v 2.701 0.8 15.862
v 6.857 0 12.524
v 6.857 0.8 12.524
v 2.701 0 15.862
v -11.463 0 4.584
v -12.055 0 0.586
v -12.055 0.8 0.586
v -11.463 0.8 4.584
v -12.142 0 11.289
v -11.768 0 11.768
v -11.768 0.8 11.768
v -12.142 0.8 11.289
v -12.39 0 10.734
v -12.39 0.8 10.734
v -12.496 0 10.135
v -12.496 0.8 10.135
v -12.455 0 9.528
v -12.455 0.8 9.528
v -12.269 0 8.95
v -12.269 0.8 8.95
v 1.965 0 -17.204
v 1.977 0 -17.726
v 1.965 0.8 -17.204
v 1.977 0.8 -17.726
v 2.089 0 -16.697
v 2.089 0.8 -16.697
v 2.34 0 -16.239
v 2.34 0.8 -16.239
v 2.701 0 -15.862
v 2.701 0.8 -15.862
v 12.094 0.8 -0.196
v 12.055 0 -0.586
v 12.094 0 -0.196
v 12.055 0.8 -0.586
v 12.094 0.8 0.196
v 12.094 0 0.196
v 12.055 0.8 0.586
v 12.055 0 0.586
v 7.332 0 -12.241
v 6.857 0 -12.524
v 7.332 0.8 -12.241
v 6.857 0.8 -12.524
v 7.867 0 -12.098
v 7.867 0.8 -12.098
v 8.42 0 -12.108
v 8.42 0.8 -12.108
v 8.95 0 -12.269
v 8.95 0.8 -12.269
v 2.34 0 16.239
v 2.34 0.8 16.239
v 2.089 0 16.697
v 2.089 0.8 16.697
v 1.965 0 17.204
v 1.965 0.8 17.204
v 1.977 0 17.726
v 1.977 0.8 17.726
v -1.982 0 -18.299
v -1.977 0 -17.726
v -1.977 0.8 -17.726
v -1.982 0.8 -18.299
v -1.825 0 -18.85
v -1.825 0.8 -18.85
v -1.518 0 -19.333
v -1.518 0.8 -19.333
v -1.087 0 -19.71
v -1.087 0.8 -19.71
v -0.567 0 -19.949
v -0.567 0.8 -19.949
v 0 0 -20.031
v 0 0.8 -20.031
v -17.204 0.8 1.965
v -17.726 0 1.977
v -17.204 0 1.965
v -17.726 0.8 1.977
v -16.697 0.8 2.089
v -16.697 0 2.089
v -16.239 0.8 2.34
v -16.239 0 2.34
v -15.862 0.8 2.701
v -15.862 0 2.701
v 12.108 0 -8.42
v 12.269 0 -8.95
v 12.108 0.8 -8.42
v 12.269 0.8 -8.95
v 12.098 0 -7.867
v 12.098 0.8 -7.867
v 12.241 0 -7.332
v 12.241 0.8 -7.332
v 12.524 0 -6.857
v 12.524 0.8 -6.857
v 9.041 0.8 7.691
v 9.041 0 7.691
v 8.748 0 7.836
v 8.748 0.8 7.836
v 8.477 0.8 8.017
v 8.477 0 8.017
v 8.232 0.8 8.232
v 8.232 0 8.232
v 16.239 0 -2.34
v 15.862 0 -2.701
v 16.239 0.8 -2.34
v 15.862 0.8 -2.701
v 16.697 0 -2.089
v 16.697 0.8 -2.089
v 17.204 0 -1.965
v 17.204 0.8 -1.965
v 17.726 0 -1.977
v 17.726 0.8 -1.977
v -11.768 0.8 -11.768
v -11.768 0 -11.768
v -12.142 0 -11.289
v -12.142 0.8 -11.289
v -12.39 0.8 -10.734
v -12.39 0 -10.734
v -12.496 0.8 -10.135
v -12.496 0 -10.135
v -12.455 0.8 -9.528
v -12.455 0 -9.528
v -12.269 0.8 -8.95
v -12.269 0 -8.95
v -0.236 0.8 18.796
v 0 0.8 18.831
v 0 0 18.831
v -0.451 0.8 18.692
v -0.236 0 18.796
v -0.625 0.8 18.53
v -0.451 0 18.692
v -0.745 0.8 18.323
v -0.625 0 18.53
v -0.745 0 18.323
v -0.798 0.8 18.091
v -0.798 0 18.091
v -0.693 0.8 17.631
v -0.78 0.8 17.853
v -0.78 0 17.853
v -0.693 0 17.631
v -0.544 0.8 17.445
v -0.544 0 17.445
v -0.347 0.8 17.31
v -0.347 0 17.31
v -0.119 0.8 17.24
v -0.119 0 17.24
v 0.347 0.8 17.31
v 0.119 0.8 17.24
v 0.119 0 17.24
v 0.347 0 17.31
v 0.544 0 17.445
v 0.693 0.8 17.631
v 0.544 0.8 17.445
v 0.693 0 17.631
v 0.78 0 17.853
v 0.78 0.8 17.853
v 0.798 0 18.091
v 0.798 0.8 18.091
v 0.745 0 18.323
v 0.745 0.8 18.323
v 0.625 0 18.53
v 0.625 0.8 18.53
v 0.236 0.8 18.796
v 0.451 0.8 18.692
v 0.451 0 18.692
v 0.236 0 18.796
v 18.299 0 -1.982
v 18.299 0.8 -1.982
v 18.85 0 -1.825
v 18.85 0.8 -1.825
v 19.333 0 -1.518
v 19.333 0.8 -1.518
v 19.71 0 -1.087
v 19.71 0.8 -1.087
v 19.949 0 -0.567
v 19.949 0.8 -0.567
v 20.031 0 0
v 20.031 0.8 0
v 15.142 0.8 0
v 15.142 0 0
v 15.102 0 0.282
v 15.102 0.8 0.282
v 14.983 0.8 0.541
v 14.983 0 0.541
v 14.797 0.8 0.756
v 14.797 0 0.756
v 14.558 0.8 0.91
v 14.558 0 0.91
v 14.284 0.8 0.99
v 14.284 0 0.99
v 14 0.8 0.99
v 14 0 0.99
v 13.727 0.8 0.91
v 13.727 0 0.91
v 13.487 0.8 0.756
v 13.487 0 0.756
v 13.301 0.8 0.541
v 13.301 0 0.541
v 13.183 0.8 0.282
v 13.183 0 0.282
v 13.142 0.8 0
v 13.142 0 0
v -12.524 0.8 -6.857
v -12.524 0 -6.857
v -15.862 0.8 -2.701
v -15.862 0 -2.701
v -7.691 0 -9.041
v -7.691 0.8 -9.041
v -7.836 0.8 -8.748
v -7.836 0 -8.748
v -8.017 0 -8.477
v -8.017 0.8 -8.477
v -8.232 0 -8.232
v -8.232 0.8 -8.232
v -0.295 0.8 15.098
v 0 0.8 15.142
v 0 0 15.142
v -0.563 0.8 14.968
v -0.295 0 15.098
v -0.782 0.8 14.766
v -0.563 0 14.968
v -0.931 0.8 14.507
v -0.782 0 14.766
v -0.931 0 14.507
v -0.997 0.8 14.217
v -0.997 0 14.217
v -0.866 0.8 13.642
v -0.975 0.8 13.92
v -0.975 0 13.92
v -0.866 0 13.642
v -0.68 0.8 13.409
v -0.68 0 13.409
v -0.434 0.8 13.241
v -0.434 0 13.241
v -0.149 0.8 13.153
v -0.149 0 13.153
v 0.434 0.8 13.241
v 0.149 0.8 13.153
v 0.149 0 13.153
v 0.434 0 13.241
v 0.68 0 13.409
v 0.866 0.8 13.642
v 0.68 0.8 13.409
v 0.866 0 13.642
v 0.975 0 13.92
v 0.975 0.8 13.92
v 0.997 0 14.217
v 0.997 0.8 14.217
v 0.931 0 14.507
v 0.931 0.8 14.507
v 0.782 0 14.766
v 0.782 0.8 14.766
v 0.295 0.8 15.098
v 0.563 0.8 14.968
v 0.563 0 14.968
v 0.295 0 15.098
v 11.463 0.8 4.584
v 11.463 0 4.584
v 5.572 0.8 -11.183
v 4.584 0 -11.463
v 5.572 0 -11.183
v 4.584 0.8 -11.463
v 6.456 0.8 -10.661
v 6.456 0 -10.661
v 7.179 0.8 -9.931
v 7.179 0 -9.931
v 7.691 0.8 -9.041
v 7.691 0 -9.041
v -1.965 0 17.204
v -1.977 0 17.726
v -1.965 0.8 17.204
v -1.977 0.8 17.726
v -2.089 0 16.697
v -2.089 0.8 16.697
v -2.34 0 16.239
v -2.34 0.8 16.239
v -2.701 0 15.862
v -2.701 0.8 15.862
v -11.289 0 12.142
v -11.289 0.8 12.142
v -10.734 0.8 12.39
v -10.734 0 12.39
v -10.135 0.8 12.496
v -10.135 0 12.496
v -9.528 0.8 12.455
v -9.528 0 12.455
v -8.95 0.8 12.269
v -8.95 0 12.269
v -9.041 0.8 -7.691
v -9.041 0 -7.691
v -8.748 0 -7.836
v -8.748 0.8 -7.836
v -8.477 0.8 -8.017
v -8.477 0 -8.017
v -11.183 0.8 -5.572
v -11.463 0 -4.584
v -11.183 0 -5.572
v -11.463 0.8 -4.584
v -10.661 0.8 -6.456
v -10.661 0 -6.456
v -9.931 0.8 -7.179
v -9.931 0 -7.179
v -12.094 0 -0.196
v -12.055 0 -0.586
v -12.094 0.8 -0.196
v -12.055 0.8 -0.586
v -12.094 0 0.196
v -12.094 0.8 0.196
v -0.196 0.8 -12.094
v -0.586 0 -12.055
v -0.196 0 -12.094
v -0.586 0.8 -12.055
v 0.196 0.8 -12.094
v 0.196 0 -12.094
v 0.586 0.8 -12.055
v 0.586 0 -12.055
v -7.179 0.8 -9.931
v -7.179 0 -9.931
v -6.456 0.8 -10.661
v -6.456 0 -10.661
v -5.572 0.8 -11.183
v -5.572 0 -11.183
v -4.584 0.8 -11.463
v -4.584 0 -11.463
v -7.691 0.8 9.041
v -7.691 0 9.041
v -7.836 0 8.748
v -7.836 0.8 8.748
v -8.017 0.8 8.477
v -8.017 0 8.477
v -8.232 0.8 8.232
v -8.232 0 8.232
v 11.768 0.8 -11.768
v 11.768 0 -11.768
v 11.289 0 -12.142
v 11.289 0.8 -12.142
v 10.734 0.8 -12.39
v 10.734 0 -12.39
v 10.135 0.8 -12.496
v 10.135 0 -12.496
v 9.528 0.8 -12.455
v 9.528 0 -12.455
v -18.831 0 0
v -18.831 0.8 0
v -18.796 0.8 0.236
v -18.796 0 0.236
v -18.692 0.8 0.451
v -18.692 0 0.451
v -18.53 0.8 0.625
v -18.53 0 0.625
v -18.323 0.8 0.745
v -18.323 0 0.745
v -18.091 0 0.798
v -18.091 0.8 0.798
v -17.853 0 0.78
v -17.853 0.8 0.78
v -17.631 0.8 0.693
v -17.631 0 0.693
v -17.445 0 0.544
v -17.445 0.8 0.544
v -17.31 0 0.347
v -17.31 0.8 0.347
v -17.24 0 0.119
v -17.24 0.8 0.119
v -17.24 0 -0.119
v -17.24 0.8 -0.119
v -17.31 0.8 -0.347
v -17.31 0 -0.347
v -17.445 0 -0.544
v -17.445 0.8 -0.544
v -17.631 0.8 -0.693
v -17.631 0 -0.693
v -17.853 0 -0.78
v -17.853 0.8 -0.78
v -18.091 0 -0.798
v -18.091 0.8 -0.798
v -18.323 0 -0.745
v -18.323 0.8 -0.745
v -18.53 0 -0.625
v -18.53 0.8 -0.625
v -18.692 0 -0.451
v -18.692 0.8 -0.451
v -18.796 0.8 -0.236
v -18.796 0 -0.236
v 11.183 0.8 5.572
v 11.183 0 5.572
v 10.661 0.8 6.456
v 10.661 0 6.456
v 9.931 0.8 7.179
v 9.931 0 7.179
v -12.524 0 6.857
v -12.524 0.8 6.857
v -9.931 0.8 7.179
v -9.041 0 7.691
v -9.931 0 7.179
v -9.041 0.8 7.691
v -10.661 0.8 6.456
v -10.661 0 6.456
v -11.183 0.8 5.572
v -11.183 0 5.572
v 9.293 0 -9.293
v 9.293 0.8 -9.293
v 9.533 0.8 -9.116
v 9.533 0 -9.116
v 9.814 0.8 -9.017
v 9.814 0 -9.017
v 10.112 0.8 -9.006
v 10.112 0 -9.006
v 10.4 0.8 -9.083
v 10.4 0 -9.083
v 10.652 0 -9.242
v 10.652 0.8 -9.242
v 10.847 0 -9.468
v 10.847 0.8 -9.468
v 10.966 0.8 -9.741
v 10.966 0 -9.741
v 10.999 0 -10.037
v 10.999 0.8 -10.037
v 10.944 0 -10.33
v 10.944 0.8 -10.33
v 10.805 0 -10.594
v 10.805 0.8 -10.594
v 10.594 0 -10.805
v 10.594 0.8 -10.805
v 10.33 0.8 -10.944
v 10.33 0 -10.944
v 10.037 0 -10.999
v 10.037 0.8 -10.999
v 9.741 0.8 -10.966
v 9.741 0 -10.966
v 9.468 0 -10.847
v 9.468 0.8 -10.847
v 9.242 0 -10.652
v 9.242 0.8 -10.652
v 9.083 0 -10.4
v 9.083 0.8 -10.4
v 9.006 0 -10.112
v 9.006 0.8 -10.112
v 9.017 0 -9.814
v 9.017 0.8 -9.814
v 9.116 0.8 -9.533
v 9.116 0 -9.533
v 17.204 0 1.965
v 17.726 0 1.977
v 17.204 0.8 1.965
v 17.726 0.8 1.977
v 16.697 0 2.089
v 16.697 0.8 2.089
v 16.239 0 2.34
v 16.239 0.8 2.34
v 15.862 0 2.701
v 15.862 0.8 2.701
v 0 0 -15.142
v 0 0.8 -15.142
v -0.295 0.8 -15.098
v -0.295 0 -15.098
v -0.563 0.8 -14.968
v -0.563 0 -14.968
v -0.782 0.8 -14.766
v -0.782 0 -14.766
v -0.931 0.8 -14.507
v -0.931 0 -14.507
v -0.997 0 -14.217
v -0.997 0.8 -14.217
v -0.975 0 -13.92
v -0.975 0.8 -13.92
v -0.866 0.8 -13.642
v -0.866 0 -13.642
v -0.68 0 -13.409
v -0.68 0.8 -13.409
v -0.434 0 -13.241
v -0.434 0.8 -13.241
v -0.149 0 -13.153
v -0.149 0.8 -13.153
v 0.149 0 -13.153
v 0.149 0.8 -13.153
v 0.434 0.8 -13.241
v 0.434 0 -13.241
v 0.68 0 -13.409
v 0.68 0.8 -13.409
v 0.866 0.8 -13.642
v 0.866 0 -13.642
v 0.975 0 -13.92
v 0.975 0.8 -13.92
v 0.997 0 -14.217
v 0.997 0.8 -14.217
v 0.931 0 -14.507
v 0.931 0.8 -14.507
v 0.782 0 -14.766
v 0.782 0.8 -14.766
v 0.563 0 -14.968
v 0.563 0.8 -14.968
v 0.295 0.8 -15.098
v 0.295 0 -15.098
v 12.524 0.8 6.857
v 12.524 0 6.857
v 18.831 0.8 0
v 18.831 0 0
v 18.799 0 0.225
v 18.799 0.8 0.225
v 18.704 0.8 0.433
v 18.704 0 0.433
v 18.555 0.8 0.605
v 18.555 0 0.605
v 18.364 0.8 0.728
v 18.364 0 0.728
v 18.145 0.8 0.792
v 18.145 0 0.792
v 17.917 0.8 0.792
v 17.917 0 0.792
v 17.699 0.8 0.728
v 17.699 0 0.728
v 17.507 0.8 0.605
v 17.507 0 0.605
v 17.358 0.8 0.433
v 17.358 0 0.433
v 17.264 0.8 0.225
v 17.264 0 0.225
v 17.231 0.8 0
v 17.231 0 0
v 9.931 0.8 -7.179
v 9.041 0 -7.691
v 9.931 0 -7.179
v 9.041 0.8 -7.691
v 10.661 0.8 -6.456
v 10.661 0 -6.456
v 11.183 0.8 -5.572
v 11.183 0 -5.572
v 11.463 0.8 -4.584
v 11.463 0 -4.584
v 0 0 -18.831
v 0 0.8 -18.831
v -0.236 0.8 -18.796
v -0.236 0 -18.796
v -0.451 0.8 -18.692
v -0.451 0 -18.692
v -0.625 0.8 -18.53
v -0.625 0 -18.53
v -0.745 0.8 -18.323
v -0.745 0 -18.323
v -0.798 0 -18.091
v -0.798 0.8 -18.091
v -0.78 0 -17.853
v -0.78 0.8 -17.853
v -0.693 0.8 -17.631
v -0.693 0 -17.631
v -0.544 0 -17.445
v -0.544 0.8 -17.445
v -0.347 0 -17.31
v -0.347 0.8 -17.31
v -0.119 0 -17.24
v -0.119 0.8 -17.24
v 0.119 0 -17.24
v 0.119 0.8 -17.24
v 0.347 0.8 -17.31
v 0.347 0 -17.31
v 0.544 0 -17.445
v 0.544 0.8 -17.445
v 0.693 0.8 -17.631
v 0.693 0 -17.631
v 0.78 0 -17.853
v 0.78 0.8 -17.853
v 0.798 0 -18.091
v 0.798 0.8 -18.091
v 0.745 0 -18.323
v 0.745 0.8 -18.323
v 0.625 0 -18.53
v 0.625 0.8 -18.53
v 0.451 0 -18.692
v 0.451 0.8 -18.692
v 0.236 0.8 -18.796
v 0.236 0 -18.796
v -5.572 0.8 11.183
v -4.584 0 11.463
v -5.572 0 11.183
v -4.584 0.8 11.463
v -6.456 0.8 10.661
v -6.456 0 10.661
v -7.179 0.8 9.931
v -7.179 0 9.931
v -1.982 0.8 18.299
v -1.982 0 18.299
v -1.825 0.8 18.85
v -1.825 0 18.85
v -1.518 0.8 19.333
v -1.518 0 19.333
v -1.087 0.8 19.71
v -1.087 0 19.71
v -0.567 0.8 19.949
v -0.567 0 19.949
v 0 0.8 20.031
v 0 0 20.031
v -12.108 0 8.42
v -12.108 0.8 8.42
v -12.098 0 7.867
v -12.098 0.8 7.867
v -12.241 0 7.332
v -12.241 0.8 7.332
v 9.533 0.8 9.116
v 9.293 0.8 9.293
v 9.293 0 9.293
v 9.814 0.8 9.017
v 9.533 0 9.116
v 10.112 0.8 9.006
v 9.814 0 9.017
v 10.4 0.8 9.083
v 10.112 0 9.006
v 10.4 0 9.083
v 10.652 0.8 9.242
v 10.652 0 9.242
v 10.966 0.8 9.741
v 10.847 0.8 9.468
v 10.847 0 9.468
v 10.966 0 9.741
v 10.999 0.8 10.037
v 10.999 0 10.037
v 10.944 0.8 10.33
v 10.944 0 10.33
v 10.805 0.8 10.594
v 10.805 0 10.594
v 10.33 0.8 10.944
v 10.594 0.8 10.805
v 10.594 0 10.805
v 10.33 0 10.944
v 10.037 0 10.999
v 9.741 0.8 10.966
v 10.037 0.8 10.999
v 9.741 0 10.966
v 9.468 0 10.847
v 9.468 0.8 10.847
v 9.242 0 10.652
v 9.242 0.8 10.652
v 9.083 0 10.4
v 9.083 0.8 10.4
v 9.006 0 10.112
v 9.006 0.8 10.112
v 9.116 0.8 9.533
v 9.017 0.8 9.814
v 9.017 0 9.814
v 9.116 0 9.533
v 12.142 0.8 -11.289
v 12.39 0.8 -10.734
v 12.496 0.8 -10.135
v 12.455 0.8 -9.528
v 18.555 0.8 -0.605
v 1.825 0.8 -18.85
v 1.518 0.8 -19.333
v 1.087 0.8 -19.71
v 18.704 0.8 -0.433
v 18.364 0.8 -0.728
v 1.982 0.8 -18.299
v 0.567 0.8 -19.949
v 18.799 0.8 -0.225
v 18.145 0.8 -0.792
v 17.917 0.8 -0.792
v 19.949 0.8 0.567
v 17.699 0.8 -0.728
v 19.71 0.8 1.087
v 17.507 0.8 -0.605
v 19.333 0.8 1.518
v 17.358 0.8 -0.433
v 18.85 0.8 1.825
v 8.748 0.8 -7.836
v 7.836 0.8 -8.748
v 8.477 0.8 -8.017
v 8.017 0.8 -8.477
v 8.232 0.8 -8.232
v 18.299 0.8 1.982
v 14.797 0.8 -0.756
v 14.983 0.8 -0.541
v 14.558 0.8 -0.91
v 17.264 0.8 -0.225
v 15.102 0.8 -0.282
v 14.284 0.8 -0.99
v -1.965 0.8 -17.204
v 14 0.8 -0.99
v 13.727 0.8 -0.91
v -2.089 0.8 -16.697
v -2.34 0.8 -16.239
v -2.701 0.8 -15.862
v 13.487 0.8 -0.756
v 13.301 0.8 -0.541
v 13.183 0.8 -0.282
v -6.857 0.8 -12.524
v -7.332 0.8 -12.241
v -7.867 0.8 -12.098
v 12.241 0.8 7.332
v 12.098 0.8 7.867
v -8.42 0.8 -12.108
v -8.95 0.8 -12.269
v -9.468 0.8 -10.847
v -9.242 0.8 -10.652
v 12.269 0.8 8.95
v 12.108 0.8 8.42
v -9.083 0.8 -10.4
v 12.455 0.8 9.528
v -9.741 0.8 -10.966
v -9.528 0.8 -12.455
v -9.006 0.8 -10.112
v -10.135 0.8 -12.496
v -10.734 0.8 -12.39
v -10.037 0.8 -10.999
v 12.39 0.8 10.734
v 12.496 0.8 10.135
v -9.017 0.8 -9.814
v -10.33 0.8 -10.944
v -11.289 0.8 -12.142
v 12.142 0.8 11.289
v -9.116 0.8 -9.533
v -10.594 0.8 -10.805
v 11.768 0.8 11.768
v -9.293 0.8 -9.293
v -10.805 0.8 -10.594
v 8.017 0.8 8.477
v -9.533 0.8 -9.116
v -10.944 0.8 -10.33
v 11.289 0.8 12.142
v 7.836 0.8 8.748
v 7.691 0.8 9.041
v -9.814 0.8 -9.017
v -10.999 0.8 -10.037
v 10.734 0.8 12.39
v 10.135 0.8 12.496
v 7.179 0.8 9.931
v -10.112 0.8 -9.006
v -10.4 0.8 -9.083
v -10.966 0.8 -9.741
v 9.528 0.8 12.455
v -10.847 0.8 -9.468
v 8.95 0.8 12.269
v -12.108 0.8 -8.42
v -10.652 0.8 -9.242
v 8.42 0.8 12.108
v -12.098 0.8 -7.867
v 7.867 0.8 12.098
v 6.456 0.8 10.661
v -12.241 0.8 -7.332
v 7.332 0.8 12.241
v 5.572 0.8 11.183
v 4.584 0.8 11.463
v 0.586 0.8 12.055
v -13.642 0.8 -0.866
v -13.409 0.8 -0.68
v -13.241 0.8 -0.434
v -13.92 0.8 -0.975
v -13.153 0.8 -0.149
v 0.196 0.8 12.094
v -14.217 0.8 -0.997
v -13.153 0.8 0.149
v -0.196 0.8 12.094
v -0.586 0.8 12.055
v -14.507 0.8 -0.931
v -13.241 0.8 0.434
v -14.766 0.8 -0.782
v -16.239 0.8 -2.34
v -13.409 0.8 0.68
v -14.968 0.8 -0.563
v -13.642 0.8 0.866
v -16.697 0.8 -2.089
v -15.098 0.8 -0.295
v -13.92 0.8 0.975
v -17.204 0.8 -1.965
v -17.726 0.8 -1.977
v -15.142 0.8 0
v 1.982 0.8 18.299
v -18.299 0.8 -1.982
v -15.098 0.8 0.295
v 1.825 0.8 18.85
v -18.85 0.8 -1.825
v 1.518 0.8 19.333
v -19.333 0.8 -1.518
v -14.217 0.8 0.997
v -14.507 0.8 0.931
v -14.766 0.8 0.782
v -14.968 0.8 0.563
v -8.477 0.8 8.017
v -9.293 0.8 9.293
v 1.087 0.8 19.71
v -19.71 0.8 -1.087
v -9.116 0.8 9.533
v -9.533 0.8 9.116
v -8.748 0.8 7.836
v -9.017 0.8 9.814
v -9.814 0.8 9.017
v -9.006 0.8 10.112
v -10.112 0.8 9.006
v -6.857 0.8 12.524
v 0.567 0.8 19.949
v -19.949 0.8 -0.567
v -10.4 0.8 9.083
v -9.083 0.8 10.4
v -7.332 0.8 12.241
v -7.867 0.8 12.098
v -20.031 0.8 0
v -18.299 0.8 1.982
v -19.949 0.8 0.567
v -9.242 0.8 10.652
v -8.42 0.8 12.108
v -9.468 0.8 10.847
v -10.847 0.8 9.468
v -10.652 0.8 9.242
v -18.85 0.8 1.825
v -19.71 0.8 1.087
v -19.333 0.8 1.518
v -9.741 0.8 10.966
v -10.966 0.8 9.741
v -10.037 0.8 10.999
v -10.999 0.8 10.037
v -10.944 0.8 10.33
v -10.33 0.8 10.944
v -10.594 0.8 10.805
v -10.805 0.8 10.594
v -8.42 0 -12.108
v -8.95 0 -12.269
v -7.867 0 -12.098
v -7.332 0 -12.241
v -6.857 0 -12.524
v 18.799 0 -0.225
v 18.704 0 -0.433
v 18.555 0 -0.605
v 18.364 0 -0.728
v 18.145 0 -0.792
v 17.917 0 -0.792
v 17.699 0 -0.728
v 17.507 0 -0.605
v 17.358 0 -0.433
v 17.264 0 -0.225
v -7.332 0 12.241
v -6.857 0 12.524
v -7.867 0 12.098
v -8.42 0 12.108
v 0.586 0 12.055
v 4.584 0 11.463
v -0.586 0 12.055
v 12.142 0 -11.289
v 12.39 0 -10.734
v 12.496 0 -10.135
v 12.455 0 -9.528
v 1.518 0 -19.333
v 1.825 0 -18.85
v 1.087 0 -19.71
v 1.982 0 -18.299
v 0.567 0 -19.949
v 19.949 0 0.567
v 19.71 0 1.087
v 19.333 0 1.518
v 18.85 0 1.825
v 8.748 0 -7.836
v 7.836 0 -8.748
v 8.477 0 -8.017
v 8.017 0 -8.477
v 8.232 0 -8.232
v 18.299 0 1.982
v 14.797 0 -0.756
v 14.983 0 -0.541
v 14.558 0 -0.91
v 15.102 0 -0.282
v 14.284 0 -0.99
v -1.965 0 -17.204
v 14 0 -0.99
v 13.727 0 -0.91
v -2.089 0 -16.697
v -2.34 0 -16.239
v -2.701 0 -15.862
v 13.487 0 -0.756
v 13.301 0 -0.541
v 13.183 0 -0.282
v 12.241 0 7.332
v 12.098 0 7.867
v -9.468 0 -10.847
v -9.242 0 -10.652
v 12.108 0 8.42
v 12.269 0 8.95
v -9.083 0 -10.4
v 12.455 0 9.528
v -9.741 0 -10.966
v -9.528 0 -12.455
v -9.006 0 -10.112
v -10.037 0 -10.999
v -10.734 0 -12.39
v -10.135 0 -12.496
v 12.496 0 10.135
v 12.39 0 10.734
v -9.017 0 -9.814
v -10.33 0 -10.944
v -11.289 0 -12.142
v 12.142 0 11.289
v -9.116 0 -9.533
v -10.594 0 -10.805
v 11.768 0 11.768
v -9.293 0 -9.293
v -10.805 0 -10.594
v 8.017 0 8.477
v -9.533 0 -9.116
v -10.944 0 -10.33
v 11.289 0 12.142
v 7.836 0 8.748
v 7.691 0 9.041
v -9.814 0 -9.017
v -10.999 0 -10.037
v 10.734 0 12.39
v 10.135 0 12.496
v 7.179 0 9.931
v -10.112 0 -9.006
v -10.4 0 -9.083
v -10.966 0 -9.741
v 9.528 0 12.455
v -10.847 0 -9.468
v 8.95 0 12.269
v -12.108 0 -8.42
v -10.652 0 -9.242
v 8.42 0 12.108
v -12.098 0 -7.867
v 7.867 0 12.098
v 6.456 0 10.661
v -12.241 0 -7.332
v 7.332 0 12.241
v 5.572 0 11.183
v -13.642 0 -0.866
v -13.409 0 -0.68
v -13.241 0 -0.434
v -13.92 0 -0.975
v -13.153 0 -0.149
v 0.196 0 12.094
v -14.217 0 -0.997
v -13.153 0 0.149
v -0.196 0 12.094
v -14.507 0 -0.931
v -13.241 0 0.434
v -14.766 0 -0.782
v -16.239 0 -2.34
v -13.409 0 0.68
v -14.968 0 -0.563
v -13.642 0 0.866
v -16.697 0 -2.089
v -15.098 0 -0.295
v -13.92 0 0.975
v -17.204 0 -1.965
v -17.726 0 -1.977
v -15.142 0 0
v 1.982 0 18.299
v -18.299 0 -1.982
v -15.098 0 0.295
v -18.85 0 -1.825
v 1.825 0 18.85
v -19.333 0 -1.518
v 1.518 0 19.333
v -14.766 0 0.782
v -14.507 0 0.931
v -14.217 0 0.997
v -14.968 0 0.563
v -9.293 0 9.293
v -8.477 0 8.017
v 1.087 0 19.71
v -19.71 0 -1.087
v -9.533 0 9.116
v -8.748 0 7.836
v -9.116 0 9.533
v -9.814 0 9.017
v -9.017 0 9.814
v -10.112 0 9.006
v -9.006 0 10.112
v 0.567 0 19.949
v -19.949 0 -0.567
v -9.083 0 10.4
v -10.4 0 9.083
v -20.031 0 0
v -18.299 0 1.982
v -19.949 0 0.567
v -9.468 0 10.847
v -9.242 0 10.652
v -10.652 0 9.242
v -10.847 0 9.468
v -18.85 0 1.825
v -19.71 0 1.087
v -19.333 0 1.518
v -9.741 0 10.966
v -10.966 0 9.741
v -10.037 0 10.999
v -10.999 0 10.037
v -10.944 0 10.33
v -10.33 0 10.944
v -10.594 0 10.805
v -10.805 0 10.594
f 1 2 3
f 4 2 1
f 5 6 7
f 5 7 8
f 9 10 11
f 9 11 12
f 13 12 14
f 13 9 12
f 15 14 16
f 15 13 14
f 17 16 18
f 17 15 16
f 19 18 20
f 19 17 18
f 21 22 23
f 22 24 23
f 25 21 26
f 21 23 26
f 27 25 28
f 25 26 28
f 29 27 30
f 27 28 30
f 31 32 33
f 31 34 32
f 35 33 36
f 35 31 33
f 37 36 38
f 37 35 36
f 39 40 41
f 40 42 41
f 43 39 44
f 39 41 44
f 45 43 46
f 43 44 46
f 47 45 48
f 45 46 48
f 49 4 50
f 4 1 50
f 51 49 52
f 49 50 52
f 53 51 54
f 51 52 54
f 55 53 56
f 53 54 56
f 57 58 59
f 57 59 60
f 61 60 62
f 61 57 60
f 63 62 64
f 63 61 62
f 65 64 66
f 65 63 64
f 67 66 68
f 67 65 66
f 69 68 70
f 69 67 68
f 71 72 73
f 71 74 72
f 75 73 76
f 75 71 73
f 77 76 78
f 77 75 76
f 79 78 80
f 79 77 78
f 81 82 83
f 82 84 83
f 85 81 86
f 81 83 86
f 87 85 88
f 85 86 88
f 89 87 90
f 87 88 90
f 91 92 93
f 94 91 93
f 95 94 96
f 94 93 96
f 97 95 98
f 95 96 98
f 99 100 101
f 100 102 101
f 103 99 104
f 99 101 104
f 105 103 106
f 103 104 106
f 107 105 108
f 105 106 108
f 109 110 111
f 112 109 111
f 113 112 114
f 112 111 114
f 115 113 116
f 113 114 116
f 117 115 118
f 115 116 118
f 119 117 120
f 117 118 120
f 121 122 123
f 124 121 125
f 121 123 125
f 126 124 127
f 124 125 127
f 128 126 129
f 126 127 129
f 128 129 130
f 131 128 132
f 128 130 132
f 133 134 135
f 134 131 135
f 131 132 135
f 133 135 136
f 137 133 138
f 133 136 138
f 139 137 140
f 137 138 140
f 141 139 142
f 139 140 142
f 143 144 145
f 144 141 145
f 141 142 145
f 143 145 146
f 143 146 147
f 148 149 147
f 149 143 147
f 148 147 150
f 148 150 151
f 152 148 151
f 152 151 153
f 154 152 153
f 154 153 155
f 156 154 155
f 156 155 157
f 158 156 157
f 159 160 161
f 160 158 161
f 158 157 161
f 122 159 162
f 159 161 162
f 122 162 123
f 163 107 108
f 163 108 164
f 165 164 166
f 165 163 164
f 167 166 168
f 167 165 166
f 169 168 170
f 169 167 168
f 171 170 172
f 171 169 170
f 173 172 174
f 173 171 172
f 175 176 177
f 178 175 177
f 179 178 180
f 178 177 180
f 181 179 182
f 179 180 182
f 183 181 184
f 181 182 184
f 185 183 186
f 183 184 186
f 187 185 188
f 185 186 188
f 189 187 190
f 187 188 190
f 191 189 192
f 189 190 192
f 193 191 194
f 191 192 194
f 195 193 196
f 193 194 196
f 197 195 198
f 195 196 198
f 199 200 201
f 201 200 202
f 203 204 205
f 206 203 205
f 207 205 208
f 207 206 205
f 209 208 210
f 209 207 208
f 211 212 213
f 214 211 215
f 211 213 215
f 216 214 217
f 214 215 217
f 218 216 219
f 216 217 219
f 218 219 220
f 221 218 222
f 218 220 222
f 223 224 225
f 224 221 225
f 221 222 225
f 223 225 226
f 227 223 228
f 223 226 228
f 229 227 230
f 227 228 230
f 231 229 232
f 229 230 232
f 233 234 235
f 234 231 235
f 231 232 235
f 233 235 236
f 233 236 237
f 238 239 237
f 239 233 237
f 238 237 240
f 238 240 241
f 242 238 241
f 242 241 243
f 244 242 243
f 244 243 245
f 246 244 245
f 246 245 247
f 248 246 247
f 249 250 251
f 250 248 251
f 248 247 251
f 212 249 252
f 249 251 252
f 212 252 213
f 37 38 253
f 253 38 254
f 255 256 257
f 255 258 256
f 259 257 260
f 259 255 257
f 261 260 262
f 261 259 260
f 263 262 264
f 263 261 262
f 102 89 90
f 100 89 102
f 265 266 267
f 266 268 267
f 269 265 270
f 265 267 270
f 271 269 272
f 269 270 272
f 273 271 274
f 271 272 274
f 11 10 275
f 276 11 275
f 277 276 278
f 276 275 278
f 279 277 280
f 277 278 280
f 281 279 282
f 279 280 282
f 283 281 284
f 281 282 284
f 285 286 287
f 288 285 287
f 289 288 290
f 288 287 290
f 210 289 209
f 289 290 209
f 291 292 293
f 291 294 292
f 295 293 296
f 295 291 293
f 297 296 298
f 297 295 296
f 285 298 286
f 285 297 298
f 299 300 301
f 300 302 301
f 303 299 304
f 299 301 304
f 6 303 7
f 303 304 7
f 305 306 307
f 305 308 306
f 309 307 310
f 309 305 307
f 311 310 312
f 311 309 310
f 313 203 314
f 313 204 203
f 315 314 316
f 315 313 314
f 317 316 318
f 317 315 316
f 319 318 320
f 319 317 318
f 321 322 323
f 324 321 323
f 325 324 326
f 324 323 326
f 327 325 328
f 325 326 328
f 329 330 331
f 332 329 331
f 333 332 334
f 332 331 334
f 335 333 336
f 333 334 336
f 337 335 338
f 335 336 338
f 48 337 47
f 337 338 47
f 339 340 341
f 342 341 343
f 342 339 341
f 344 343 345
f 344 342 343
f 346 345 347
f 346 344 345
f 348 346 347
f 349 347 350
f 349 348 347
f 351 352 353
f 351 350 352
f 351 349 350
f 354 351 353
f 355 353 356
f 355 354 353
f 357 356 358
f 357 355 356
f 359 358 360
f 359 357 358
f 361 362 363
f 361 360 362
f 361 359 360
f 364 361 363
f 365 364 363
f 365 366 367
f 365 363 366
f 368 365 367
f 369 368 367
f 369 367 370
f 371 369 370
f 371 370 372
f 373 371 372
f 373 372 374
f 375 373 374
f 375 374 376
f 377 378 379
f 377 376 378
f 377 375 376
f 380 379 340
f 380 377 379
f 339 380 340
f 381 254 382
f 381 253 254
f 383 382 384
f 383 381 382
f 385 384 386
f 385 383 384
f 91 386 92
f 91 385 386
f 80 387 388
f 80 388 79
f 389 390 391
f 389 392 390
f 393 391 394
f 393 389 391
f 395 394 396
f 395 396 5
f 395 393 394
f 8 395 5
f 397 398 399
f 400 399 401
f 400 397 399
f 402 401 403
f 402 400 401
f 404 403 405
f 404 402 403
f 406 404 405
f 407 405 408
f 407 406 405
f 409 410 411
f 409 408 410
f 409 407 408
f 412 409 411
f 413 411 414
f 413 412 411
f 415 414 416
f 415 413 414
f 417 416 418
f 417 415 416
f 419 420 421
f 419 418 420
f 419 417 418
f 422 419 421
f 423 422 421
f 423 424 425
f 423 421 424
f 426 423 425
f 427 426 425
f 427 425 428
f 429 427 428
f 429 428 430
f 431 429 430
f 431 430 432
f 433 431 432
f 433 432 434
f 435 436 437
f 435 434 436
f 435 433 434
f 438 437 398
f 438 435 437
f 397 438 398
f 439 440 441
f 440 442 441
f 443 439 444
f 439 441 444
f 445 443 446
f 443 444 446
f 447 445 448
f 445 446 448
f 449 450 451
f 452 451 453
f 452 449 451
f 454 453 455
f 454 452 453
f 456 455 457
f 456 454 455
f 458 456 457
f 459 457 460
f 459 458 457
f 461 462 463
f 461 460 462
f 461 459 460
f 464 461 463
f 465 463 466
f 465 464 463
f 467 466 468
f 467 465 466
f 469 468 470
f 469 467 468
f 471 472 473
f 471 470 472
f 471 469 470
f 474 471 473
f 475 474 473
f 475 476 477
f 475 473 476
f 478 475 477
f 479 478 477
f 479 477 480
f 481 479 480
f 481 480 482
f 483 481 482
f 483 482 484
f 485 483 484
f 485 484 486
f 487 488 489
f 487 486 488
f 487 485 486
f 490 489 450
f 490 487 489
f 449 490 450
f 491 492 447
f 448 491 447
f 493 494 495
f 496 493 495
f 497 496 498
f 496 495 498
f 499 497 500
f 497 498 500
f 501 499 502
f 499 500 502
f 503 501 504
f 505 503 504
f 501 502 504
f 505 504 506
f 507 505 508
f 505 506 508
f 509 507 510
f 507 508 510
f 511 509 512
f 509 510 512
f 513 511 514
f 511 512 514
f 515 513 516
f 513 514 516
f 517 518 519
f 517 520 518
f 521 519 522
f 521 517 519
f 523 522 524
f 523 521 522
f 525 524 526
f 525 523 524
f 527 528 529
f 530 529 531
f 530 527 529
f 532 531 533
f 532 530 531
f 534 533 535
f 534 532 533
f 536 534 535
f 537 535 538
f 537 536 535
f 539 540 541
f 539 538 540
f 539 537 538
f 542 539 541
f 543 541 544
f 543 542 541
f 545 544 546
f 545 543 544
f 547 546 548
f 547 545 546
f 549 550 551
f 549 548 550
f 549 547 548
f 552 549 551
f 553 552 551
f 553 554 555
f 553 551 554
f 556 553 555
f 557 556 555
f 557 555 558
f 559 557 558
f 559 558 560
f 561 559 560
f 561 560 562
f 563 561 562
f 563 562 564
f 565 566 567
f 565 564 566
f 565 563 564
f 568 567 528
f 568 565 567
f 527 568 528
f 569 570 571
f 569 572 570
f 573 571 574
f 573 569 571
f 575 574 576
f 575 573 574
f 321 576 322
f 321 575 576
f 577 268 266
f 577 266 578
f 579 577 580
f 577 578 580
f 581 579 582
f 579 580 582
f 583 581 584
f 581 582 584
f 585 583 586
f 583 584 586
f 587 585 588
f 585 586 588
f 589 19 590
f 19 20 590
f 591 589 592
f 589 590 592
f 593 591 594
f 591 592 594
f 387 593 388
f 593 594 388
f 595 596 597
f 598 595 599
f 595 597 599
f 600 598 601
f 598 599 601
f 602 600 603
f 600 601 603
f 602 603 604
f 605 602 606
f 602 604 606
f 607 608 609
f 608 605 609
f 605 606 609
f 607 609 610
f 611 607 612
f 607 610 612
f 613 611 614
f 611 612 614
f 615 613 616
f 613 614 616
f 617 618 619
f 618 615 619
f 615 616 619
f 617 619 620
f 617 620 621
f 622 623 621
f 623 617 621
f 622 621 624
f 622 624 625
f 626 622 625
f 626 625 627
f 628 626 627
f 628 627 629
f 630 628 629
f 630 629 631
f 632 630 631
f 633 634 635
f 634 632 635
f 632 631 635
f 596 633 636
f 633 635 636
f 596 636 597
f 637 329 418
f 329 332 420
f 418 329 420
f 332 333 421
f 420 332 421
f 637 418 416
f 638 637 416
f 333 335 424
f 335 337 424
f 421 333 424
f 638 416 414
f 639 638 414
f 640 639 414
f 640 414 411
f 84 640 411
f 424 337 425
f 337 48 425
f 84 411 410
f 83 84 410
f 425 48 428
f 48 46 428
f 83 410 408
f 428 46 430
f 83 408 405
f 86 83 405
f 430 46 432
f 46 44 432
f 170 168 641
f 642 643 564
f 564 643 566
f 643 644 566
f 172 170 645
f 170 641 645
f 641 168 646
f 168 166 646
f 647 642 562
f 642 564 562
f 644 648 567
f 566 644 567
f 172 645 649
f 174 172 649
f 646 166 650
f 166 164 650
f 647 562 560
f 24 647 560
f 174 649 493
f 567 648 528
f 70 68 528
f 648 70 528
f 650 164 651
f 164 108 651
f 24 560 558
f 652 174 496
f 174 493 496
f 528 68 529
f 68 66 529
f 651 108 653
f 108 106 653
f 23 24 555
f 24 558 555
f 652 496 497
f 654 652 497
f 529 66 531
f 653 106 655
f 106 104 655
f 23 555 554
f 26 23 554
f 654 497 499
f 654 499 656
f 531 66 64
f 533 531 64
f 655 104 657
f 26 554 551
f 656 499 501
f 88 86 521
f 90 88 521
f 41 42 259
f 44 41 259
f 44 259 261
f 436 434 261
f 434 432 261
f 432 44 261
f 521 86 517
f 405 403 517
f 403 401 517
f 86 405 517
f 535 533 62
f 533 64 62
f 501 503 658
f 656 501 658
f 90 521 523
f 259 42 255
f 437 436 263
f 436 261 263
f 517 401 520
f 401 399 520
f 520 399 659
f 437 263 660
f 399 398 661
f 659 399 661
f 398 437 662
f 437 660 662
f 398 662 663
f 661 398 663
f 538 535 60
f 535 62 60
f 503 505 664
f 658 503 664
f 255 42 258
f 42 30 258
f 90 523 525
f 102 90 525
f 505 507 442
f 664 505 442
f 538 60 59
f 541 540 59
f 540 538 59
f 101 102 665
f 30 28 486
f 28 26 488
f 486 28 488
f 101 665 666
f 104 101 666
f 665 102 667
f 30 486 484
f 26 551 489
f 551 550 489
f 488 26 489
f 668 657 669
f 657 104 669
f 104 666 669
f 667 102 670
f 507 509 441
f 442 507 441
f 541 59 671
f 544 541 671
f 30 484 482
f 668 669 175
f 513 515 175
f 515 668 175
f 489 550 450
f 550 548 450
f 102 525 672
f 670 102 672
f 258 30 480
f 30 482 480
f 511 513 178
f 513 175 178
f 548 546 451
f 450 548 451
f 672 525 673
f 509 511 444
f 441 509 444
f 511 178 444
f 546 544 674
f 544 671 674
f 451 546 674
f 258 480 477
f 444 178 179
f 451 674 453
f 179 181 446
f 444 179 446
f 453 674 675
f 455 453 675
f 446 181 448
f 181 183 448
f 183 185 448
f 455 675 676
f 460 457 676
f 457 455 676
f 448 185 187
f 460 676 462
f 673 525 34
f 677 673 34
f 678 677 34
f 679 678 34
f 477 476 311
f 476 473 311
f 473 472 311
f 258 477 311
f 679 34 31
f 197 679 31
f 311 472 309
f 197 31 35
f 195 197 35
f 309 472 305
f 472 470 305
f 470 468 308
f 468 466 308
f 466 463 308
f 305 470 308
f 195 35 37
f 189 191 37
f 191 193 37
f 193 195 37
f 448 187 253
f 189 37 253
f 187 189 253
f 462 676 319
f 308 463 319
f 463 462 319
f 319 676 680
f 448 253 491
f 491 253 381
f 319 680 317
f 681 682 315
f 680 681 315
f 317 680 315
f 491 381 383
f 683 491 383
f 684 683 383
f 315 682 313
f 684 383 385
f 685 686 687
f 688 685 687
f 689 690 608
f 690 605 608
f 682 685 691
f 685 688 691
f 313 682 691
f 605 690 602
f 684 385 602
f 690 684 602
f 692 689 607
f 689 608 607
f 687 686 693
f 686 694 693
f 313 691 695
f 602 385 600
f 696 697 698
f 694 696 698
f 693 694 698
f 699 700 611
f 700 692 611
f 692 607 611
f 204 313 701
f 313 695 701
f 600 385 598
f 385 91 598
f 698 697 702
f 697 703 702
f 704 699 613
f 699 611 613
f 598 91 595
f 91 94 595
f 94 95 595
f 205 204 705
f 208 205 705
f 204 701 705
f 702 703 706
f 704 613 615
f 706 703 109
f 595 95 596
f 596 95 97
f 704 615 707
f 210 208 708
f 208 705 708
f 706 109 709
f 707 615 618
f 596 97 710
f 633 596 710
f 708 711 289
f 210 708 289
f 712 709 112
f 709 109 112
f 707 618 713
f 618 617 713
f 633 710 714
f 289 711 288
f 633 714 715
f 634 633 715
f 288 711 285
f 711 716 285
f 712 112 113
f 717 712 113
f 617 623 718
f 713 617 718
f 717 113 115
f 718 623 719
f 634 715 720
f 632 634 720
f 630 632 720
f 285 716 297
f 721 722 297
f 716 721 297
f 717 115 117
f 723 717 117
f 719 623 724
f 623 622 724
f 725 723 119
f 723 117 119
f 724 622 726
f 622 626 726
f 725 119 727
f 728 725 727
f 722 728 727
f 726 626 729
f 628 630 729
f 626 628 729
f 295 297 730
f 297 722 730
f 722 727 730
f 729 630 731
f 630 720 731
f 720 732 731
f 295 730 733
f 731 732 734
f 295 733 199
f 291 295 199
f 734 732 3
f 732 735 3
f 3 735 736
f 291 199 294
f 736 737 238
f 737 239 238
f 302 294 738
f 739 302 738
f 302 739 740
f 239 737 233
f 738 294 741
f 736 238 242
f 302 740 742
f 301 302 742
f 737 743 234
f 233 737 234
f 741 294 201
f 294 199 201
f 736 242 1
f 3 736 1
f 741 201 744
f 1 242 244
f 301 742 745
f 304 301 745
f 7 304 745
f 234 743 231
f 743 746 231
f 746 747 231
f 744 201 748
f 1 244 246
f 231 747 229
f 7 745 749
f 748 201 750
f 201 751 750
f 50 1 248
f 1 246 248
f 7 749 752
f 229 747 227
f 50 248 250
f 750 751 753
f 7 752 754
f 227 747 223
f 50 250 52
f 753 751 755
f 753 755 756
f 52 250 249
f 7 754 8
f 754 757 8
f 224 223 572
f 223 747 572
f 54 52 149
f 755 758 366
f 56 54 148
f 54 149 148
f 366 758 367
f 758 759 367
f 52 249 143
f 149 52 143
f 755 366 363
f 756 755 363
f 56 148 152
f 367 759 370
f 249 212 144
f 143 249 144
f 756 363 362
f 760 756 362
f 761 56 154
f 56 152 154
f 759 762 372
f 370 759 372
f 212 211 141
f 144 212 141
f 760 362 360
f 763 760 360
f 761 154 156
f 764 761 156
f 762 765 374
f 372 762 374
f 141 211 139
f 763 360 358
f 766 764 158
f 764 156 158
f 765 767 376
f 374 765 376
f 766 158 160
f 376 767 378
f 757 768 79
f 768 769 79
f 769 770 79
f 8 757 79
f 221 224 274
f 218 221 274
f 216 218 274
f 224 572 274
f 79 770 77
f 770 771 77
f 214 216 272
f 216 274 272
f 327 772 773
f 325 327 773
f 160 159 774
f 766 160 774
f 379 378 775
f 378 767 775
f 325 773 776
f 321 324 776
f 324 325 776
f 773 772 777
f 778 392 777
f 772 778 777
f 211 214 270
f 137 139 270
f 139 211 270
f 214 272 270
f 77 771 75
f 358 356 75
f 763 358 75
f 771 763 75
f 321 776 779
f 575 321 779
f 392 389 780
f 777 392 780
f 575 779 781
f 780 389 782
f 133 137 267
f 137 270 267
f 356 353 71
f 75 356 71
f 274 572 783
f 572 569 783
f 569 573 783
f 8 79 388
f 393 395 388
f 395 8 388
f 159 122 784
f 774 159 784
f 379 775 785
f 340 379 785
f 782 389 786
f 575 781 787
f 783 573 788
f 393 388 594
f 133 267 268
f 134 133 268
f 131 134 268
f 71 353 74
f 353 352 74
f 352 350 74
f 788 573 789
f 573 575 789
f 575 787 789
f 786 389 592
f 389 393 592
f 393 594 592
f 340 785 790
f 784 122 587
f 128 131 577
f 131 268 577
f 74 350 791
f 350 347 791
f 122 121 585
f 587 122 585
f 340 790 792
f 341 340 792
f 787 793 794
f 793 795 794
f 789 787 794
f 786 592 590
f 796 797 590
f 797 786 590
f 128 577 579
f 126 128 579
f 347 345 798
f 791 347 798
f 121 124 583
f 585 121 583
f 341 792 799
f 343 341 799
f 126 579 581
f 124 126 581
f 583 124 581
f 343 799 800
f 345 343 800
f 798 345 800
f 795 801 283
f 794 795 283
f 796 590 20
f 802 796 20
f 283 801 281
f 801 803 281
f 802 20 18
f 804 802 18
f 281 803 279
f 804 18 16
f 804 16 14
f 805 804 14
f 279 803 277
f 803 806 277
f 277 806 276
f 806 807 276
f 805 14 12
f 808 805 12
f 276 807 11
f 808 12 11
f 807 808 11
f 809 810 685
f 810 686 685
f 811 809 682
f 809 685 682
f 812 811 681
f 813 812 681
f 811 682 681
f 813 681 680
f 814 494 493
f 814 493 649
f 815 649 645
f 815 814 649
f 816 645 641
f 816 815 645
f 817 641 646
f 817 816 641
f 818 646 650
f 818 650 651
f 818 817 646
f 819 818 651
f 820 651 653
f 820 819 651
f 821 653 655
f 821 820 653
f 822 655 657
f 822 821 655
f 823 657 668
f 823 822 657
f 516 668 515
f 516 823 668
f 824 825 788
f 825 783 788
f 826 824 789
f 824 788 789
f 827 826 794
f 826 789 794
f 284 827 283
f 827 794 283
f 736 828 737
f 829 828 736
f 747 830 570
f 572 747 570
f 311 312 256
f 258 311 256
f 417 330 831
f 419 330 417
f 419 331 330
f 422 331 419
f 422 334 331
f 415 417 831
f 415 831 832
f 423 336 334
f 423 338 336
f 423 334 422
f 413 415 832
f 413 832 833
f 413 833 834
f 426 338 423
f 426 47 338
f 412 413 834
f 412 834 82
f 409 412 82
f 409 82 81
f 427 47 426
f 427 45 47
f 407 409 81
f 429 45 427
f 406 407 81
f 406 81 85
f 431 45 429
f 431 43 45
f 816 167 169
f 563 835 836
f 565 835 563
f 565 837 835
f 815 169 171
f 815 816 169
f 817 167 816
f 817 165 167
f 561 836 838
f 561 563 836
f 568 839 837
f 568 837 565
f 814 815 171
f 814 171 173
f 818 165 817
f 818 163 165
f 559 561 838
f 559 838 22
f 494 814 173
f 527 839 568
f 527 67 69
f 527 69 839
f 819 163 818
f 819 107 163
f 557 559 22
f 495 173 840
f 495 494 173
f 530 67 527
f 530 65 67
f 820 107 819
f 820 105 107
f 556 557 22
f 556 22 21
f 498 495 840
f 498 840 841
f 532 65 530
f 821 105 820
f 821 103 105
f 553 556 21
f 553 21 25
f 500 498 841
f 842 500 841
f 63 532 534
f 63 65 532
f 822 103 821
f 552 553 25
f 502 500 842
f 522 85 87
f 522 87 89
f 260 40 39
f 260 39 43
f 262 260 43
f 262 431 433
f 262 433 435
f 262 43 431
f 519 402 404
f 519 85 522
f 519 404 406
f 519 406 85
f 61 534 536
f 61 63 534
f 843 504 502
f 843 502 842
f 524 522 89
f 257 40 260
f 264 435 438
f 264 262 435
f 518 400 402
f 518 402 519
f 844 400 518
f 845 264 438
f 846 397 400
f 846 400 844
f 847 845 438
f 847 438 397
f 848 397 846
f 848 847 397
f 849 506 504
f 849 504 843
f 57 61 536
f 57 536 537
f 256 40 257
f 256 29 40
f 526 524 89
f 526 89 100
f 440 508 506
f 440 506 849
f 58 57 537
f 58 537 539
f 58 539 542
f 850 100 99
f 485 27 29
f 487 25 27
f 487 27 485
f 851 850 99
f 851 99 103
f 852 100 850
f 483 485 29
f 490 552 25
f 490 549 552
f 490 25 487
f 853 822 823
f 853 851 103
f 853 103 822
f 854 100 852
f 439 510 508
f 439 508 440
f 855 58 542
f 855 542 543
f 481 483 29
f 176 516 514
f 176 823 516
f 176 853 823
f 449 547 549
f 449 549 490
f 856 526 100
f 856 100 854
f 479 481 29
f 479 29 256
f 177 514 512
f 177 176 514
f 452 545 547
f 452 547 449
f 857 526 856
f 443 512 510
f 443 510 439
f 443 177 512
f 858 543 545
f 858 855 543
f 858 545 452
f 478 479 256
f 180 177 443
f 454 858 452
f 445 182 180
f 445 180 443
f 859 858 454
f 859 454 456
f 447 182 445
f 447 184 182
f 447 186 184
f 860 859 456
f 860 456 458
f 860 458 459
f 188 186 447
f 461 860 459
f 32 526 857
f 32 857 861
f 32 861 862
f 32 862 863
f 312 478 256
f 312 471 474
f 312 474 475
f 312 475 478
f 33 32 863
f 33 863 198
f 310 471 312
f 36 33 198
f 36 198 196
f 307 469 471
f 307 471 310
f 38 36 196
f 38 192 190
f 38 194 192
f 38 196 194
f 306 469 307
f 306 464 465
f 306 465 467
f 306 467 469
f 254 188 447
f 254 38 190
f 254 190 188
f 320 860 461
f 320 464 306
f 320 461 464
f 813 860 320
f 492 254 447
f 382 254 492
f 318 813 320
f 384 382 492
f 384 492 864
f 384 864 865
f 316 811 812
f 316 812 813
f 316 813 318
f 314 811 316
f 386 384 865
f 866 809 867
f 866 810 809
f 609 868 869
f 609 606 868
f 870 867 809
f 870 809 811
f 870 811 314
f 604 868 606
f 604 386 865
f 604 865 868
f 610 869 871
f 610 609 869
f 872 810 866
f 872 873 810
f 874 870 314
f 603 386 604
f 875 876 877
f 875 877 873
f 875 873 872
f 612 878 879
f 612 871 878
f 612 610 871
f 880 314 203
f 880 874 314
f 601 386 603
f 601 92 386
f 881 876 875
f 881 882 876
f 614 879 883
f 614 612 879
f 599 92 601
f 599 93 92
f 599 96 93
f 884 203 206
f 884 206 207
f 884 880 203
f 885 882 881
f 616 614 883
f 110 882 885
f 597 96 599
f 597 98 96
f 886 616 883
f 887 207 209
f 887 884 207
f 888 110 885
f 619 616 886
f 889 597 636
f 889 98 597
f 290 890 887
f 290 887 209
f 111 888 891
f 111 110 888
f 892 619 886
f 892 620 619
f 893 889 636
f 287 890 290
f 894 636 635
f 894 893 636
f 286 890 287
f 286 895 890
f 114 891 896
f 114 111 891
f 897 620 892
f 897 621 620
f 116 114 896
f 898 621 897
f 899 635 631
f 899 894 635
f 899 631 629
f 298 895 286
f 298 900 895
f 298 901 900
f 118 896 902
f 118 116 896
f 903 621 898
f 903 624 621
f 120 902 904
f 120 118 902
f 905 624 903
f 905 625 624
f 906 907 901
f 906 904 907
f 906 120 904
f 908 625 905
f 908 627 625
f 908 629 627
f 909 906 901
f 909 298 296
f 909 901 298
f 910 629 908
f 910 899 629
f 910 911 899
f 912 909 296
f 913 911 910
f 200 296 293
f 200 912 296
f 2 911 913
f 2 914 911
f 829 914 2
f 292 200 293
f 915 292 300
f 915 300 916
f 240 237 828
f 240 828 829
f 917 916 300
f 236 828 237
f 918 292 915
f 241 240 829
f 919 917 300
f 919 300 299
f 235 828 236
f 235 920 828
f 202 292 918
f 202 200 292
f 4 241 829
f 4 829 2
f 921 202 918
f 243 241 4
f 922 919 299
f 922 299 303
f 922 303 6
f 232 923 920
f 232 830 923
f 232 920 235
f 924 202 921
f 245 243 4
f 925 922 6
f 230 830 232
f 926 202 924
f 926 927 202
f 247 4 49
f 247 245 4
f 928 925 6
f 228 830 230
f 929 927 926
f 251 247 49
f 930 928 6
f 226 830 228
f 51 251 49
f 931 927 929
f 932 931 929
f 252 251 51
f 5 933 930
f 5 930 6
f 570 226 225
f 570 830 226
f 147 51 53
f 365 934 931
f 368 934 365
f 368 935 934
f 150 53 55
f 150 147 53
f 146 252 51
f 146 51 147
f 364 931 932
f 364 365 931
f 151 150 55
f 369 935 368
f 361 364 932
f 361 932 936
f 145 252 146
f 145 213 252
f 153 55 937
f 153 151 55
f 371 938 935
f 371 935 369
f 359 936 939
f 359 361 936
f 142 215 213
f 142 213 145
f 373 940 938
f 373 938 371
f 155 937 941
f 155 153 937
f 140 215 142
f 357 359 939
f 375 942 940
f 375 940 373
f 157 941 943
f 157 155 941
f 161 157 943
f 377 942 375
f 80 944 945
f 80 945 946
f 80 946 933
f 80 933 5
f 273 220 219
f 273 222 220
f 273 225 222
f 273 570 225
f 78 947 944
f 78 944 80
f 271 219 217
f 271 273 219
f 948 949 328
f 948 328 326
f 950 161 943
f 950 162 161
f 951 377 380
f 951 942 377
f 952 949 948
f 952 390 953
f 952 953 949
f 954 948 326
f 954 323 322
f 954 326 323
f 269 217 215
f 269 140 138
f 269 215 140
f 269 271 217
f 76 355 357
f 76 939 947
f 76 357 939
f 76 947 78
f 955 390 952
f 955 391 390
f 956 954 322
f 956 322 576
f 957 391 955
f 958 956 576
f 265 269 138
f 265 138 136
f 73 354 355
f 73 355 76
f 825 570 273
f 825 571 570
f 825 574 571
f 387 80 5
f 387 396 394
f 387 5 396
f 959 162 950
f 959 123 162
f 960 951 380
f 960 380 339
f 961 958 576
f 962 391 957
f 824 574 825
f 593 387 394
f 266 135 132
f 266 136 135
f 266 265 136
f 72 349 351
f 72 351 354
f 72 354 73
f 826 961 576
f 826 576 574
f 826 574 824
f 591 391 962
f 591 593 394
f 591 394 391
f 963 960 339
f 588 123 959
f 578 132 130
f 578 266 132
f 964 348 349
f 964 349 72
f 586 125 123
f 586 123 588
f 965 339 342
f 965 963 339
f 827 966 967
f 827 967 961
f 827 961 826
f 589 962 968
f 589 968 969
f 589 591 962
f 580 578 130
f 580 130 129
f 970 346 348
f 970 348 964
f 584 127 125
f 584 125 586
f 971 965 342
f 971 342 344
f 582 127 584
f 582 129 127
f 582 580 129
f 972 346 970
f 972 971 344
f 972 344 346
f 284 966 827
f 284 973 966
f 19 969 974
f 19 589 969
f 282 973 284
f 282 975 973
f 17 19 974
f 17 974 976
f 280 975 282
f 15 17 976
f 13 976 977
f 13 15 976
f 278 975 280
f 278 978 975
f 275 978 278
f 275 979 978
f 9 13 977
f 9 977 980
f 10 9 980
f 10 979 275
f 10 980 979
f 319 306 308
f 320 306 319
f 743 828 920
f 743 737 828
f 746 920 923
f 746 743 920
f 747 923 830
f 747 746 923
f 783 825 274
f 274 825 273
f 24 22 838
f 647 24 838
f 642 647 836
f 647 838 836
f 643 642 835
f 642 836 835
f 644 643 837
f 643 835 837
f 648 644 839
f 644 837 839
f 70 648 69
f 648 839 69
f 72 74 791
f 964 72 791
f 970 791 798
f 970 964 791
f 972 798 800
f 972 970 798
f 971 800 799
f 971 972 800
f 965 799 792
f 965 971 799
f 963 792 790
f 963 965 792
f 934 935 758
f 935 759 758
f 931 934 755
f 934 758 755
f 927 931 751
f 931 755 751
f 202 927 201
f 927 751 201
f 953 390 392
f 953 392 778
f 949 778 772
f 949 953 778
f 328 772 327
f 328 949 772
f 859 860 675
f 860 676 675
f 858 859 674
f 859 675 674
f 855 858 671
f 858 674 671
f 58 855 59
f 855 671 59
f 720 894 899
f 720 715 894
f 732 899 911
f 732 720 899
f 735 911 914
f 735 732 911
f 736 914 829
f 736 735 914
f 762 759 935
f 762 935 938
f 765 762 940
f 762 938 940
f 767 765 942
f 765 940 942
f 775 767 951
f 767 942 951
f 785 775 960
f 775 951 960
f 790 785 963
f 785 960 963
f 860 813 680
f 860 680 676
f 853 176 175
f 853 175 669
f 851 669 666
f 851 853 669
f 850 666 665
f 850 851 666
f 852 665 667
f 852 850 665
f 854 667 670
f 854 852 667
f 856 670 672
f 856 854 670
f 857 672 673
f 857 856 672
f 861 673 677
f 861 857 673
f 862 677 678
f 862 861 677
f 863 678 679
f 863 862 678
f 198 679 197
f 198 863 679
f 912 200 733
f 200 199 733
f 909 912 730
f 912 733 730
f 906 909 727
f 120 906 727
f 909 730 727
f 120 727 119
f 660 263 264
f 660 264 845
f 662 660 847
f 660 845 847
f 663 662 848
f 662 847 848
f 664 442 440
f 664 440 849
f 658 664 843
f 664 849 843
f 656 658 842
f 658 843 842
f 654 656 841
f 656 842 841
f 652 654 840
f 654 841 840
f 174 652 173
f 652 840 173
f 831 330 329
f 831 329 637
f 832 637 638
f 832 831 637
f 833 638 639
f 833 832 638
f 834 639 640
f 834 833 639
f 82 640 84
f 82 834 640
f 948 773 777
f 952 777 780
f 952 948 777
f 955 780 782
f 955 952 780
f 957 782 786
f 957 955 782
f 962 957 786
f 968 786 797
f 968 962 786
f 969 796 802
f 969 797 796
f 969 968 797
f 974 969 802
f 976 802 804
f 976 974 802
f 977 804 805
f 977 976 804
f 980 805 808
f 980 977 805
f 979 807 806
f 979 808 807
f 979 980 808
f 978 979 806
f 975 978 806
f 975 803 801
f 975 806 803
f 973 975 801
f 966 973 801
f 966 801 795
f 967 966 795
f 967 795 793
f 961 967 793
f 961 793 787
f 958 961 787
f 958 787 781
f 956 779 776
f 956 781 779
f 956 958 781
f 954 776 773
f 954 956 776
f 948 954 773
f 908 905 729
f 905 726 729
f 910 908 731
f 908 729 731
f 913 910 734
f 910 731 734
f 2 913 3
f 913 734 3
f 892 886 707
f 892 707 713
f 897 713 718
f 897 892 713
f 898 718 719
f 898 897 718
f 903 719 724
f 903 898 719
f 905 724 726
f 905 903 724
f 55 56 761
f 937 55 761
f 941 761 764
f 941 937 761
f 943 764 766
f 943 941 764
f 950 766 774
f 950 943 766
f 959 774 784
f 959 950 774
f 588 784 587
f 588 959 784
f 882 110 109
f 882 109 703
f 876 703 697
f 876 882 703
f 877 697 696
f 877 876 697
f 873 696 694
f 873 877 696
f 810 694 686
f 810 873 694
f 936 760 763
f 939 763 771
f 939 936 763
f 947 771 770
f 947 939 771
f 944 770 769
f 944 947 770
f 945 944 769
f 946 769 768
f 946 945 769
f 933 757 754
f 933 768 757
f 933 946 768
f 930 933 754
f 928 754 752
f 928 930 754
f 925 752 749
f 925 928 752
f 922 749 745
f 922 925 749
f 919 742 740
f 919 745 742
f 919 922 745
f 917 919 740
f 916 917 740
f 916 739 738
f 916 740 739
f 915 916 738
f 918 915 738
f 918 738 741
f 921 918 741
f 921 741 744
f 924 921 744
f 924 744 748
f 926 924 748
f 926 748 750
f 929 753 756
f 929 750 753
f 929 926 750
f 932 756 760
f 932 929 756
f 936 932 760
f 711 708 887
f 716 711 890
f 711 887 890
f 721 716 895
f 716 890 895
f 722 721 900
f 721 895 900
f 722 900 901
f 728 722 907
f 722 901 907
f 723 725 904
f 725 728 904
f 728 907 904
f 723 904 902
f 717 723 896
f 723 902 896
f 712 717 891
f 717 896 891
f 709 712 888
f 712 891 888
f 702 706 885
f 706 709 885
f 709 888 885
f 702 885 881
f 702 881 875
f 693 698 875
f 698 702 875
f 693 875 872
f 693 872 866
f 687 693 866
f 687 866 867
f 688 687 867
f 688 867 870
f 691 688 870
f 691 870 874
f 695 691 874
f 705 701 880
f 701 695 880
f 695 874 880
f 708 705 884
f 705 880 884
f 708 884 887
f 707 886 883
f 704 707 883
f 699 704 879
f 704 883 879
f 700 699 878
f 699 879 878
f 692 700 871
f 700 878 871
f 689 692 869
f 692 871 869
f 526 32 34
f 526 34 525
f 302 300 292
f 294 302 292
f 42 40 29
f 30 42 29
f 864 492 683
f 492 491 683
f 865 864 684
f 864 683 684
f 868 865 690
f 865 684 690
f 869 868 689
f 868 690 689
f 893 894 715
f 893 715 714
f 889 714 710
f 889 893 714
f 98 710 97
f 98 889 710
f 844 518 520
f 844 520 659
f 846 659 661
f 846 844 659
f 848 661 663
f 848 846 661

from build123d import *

# Parameters (mm, degrees)
EXTRUDE_1_DEPTH = 0.8
FILLET_1_R      = 4
FILLET_2_R      = 2


with BuildPart() as part:
    # 草图1 → 凸台-拉伸1 (new body)
    with BuildSketch(Plane(origin=(0, 0, 0), x_dir=(1, 0, 0), z_dir=(0, 1, 0))):
        with BuildLine():
            ThreePointArc((1.559359784, 16.778866316), (1.803429124, 18.895886668), (0, 20.03122292))
            Line((0, 20.03122292), (0, 18.83122292))
            ThreePointArc((0, 18.83122292), (0.8, 18.03122292), (0, 17.23122292))
            Line((0, 17.23122292), (0, 15.142135624))
            ThreePointArc((0, 15.142135624), (1, 14.142135624), (0, 13.142135624))
            Line((0, 13.142135624), (0, 12.142135624))
            Line((0, 12.142135624), (7.708712153, 11))
            ThreePointArc((7.708712153, 11), (7.543556444, 9.535365676), (8.232233047, 8.232233047))
            Line((8.232233047, 8.232233047), (9.292893219, 9.292893219))
            ThreePointArc((9.292893219, 9.292893219), (9.292893219, 10.707106781), (10.707106781, 10.707106781))
            Line((10.707106781, 10.707106781), (11.767766953, 11.767766953))
            ThreePointArc((11.767766953, 11.767766953), (9.864121635, 12.496304683), (8.05080027, 11.565445755))
            Line((8.05080027, 11.565445755), (1.559359784, 16.778866316))
        make_face()
    extrude_1 = extrude(amount=EXTRUDE_1_DEPTH)

    # 镜向1: 凸台-拉伸1 across plane
    add(extrude_1.mirror(Plane(origin=(0, 0.8, 0), x_dir=(-0.707106781, 0, 0.707106781), z_dir=(-0.707106781, 0, -0.707106781))))

    # 镜向2: part across plane


with BuildPart() as part_1:
    add(part.part)
    add(part.part.mirror(Plane(origin=(0, 0.8, 0), x_dir=(0, 0, 1), z_dir=(1, 0, 0))))

    # 镜向3: part across plane


with BuildPart() as part_2:
    add(part_1.part)
    add(part_1.part.mirror(Plane(origin=(0, 0.8, 0), x_dir=(1, 0, 0), z_dir=(0, 0, 1))))

    # 圆角1
    fillet_1_edges = [part_2.edges().sort_by_distance(p)[0] for p in [
        (7.708712153, 0.4, 11),
        (11, 0.4, 7.708712153),
        (12.142135624, 0.4, 0),
        (0, 0.4, 12.142135624),
        (-7.708712153, 0.4, 11),
        (-11, 0.4, 7.708712153),
        (-12.142135624, 0.4, 0),
        (7.708712153, 0.4, -11),
        (11, 0.4, -7.708712153),
        (0, 0.4, -12.142135624),
        (-7.708712153, 0.4, -11),
        (-11, 0.4, -7.708712153),
    ]]
    fillet(fillet_1_edges, radius=FILLET_1_R)

    # 圆角2
    fillet_2_edges = [part_2.edges().sort_by_distance(p)[0] for p in [
        (8.05080027, 0.4, 11.565445755),
        (1.559359784, 0.4, 16.778866316),
        (-1.559359784, 0.4, 16.778866316),
        (16.778866316, 0.4, 1.559359784),
        (11.565445755, 0.4, 8.05080027),
        (-11.565445755, 0.4, 8.05080027),
        (-8.05080027, 0.4, 11.565445755),
        (-16.778866316, 0.4, 1.559359784),
        (1.559359784, 0.4, -16.778866316),
        (8.05080027, 0.4, -11.565445755),
        (16.778866316, 0.4, -1.559359784),
        (11.565445755, 0.4, -8.05080027),
        (-8.05080027, 0.4, -11.565445755),
        (-1.559359784, 0.4, -16.778866316),
        (-16.778866316, 0.4, -1.559359784),
        (-11.565445755, 0.4, -8.05080027),
    ]]
    fillet(fillet_2_edges, radius=FILLET_2_R)


solid = part_2.part
